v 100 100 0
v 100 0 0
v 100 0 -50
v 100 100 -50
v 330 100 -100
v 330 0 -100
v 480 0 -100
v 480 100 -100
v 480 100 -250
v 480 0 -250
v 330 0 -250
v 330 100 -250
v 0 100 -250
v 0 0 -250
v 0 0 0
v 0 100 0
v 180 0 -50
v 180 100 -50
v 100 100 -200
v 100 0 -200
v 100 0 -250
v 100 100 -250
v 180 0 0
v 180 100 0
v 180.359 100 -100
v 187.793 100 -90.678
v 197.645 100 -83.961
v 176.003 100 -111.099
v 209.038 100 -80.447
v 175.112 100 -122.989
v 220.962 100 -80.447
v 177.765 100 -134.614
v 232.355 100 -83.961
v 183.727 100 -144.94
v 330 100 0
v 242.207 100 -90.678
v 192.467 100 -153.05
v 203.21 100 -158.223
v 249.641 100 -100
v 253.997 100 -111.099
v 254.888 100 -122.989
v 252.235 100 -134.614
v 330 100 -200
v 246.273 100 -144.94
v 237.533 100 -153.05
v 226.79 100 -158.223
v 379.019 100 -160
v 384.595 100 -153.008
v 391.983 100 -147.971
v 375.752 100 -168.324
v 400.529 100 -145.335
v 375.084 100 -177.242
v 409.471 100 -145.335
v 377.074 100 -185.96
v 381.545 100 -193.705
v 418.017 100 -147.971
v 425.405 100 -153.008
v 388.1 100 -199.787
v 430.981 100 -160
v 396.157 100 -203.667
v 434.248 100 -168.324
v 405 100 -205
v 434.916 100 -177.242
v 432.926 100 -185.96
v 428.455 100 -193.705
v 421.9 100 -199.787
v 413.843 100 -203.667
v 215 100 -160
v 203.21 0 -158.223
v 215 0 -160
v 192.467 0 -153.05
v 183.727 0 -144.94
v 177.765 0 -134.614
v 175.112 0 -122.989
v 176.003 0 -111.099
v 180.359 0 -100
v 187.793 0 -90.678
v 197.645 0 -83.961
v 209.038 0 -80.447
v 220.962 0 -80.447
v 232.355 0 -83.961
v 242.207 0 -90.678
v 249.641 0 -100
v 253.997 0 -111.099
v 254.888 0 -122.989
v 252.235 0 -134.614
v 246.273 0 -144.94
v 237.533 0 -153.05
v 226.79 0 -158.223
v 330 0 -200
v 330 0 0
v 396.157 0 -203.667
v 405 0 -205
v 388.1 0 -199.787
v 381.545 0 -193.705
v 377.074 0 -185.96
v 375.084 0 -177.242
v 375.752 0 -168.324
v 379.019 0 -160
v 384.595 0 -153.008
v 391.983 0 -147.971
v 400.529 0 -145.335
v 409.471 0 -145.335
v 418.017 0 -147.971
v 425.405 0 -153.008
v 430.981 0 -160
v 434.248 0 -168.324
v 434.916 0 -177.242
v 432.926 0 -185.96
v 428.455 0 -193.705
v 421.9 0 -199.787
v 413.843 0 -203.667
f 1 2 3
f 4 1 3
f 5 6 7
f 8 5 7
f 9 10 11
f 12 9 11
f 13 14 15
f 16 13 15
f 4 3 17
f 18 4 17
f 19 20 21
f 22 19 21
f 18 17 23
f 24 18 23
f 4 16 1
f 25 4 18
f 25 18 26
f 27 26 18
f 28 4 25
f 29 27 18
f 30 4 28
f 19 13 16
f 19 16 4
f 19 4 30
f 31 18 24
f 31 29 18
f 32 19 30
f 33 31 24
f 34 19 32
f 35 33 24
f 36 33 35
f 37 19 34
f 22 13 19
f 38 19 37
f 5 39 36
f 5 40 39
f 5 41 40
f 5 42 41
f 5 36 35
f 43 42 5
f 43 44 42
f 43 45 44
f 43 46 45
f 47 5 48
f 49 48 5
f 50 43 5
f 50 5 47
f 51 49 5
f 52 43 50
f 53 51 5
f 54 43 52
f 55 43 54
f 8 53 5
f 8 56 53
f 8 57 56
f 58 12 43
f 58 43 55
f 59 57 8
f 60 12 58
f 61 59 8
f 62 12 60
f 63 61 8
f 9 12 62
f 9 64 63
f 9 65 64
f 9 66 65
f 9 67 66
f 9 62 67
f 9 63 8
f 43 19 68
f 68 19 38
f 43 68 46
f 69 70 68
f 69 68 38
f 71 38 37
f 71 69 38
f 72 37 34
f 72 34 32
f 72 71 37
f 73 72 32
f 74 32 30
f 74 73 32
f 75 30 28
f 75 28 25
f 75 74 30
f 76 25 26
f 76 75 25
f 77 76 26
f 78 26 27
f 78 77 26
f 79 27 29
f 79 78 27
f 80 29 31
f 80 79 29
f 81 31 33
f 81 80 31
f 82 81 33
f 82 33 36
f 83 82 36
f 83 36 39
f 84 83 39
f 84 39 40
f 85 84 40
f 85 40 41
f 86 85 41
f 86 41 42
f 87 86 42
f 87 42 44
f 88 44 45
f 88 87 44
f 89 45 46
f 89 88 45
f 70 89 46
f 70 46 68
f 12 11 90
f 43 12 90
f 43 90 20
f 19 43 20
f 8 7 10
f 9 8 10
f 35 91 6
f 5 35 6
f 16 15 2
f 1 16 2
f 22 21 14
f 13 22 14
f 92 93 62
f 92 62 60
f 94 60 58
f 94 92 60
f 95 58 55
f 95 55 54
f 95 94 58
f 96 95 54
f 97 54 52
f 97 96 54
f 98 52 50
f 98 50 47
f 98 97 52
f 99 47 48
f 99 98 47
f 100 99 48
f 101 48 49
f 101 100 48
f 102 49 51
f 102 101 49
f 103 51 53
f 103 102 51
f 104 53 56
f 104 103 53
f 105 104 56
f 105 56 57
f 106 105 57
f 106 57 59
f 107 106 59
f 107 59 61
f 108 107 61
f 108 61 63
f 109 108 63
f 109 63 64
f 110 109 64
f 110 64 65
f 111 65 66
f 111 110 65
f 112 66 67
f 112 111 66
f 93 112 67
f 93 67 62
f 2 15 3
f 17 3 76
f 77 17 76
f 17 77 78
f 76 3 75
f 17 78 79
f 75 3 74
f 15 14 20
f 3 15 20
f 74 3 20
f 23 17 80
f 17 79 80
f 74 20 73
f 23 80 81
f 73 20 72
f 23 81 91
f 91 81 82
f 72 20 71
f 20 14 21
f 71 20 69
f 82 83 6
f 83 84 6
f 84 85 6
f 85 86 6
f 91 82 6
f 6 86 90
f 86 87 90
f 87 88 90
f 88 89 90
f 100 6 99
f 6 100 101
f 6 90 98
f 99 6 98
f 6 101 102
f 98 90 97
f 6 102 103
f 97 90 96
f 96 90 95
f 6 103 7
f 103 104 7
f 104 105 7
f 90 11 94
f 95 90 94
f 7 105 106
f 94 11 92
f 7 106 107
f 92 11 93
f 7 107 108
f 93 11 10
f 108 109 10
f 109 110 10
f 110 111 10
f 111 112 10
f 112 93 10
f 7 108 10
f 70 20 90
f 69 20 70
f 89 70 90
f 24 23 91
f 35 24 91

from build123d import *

# Parameters (mm, degrees)
SKETCH1_R           = 40
SKETCH1_R_2         = 30
BOSS_EXTRUDE1_DEPTH = 100


with BuildPart() as part:
    # Sketch1 → Boss-Extrude1 (new body)
    with BuildSketch(Plane(origin=(0, 0, 0), x_dir=(1, 0, 0), z_dir=(0, 1, 0))):
        Polygon((0, 0), (100, 0), (100, 50), (180, 50), (180, 0), (330, 0), (330, 100), (480, 100), (480, 250), (330, 250), (330, 200), (100, 200), (100, 250), (0, 250), align=None)
        with Locations(Location((215, 120, 0), (0, 0, 90))):
            Circle(SKETCH1_R, mode=Mode.SUBTRACT)
        with Locations(Location((405, 175, 0), (0, 0, 90))):
            Circle(SKETCH1_R_2, mode=Mode.SUBTRACT)
    extrude(amount=BOSS_EXTRUDE1_DEPTH)


solid = part.part
